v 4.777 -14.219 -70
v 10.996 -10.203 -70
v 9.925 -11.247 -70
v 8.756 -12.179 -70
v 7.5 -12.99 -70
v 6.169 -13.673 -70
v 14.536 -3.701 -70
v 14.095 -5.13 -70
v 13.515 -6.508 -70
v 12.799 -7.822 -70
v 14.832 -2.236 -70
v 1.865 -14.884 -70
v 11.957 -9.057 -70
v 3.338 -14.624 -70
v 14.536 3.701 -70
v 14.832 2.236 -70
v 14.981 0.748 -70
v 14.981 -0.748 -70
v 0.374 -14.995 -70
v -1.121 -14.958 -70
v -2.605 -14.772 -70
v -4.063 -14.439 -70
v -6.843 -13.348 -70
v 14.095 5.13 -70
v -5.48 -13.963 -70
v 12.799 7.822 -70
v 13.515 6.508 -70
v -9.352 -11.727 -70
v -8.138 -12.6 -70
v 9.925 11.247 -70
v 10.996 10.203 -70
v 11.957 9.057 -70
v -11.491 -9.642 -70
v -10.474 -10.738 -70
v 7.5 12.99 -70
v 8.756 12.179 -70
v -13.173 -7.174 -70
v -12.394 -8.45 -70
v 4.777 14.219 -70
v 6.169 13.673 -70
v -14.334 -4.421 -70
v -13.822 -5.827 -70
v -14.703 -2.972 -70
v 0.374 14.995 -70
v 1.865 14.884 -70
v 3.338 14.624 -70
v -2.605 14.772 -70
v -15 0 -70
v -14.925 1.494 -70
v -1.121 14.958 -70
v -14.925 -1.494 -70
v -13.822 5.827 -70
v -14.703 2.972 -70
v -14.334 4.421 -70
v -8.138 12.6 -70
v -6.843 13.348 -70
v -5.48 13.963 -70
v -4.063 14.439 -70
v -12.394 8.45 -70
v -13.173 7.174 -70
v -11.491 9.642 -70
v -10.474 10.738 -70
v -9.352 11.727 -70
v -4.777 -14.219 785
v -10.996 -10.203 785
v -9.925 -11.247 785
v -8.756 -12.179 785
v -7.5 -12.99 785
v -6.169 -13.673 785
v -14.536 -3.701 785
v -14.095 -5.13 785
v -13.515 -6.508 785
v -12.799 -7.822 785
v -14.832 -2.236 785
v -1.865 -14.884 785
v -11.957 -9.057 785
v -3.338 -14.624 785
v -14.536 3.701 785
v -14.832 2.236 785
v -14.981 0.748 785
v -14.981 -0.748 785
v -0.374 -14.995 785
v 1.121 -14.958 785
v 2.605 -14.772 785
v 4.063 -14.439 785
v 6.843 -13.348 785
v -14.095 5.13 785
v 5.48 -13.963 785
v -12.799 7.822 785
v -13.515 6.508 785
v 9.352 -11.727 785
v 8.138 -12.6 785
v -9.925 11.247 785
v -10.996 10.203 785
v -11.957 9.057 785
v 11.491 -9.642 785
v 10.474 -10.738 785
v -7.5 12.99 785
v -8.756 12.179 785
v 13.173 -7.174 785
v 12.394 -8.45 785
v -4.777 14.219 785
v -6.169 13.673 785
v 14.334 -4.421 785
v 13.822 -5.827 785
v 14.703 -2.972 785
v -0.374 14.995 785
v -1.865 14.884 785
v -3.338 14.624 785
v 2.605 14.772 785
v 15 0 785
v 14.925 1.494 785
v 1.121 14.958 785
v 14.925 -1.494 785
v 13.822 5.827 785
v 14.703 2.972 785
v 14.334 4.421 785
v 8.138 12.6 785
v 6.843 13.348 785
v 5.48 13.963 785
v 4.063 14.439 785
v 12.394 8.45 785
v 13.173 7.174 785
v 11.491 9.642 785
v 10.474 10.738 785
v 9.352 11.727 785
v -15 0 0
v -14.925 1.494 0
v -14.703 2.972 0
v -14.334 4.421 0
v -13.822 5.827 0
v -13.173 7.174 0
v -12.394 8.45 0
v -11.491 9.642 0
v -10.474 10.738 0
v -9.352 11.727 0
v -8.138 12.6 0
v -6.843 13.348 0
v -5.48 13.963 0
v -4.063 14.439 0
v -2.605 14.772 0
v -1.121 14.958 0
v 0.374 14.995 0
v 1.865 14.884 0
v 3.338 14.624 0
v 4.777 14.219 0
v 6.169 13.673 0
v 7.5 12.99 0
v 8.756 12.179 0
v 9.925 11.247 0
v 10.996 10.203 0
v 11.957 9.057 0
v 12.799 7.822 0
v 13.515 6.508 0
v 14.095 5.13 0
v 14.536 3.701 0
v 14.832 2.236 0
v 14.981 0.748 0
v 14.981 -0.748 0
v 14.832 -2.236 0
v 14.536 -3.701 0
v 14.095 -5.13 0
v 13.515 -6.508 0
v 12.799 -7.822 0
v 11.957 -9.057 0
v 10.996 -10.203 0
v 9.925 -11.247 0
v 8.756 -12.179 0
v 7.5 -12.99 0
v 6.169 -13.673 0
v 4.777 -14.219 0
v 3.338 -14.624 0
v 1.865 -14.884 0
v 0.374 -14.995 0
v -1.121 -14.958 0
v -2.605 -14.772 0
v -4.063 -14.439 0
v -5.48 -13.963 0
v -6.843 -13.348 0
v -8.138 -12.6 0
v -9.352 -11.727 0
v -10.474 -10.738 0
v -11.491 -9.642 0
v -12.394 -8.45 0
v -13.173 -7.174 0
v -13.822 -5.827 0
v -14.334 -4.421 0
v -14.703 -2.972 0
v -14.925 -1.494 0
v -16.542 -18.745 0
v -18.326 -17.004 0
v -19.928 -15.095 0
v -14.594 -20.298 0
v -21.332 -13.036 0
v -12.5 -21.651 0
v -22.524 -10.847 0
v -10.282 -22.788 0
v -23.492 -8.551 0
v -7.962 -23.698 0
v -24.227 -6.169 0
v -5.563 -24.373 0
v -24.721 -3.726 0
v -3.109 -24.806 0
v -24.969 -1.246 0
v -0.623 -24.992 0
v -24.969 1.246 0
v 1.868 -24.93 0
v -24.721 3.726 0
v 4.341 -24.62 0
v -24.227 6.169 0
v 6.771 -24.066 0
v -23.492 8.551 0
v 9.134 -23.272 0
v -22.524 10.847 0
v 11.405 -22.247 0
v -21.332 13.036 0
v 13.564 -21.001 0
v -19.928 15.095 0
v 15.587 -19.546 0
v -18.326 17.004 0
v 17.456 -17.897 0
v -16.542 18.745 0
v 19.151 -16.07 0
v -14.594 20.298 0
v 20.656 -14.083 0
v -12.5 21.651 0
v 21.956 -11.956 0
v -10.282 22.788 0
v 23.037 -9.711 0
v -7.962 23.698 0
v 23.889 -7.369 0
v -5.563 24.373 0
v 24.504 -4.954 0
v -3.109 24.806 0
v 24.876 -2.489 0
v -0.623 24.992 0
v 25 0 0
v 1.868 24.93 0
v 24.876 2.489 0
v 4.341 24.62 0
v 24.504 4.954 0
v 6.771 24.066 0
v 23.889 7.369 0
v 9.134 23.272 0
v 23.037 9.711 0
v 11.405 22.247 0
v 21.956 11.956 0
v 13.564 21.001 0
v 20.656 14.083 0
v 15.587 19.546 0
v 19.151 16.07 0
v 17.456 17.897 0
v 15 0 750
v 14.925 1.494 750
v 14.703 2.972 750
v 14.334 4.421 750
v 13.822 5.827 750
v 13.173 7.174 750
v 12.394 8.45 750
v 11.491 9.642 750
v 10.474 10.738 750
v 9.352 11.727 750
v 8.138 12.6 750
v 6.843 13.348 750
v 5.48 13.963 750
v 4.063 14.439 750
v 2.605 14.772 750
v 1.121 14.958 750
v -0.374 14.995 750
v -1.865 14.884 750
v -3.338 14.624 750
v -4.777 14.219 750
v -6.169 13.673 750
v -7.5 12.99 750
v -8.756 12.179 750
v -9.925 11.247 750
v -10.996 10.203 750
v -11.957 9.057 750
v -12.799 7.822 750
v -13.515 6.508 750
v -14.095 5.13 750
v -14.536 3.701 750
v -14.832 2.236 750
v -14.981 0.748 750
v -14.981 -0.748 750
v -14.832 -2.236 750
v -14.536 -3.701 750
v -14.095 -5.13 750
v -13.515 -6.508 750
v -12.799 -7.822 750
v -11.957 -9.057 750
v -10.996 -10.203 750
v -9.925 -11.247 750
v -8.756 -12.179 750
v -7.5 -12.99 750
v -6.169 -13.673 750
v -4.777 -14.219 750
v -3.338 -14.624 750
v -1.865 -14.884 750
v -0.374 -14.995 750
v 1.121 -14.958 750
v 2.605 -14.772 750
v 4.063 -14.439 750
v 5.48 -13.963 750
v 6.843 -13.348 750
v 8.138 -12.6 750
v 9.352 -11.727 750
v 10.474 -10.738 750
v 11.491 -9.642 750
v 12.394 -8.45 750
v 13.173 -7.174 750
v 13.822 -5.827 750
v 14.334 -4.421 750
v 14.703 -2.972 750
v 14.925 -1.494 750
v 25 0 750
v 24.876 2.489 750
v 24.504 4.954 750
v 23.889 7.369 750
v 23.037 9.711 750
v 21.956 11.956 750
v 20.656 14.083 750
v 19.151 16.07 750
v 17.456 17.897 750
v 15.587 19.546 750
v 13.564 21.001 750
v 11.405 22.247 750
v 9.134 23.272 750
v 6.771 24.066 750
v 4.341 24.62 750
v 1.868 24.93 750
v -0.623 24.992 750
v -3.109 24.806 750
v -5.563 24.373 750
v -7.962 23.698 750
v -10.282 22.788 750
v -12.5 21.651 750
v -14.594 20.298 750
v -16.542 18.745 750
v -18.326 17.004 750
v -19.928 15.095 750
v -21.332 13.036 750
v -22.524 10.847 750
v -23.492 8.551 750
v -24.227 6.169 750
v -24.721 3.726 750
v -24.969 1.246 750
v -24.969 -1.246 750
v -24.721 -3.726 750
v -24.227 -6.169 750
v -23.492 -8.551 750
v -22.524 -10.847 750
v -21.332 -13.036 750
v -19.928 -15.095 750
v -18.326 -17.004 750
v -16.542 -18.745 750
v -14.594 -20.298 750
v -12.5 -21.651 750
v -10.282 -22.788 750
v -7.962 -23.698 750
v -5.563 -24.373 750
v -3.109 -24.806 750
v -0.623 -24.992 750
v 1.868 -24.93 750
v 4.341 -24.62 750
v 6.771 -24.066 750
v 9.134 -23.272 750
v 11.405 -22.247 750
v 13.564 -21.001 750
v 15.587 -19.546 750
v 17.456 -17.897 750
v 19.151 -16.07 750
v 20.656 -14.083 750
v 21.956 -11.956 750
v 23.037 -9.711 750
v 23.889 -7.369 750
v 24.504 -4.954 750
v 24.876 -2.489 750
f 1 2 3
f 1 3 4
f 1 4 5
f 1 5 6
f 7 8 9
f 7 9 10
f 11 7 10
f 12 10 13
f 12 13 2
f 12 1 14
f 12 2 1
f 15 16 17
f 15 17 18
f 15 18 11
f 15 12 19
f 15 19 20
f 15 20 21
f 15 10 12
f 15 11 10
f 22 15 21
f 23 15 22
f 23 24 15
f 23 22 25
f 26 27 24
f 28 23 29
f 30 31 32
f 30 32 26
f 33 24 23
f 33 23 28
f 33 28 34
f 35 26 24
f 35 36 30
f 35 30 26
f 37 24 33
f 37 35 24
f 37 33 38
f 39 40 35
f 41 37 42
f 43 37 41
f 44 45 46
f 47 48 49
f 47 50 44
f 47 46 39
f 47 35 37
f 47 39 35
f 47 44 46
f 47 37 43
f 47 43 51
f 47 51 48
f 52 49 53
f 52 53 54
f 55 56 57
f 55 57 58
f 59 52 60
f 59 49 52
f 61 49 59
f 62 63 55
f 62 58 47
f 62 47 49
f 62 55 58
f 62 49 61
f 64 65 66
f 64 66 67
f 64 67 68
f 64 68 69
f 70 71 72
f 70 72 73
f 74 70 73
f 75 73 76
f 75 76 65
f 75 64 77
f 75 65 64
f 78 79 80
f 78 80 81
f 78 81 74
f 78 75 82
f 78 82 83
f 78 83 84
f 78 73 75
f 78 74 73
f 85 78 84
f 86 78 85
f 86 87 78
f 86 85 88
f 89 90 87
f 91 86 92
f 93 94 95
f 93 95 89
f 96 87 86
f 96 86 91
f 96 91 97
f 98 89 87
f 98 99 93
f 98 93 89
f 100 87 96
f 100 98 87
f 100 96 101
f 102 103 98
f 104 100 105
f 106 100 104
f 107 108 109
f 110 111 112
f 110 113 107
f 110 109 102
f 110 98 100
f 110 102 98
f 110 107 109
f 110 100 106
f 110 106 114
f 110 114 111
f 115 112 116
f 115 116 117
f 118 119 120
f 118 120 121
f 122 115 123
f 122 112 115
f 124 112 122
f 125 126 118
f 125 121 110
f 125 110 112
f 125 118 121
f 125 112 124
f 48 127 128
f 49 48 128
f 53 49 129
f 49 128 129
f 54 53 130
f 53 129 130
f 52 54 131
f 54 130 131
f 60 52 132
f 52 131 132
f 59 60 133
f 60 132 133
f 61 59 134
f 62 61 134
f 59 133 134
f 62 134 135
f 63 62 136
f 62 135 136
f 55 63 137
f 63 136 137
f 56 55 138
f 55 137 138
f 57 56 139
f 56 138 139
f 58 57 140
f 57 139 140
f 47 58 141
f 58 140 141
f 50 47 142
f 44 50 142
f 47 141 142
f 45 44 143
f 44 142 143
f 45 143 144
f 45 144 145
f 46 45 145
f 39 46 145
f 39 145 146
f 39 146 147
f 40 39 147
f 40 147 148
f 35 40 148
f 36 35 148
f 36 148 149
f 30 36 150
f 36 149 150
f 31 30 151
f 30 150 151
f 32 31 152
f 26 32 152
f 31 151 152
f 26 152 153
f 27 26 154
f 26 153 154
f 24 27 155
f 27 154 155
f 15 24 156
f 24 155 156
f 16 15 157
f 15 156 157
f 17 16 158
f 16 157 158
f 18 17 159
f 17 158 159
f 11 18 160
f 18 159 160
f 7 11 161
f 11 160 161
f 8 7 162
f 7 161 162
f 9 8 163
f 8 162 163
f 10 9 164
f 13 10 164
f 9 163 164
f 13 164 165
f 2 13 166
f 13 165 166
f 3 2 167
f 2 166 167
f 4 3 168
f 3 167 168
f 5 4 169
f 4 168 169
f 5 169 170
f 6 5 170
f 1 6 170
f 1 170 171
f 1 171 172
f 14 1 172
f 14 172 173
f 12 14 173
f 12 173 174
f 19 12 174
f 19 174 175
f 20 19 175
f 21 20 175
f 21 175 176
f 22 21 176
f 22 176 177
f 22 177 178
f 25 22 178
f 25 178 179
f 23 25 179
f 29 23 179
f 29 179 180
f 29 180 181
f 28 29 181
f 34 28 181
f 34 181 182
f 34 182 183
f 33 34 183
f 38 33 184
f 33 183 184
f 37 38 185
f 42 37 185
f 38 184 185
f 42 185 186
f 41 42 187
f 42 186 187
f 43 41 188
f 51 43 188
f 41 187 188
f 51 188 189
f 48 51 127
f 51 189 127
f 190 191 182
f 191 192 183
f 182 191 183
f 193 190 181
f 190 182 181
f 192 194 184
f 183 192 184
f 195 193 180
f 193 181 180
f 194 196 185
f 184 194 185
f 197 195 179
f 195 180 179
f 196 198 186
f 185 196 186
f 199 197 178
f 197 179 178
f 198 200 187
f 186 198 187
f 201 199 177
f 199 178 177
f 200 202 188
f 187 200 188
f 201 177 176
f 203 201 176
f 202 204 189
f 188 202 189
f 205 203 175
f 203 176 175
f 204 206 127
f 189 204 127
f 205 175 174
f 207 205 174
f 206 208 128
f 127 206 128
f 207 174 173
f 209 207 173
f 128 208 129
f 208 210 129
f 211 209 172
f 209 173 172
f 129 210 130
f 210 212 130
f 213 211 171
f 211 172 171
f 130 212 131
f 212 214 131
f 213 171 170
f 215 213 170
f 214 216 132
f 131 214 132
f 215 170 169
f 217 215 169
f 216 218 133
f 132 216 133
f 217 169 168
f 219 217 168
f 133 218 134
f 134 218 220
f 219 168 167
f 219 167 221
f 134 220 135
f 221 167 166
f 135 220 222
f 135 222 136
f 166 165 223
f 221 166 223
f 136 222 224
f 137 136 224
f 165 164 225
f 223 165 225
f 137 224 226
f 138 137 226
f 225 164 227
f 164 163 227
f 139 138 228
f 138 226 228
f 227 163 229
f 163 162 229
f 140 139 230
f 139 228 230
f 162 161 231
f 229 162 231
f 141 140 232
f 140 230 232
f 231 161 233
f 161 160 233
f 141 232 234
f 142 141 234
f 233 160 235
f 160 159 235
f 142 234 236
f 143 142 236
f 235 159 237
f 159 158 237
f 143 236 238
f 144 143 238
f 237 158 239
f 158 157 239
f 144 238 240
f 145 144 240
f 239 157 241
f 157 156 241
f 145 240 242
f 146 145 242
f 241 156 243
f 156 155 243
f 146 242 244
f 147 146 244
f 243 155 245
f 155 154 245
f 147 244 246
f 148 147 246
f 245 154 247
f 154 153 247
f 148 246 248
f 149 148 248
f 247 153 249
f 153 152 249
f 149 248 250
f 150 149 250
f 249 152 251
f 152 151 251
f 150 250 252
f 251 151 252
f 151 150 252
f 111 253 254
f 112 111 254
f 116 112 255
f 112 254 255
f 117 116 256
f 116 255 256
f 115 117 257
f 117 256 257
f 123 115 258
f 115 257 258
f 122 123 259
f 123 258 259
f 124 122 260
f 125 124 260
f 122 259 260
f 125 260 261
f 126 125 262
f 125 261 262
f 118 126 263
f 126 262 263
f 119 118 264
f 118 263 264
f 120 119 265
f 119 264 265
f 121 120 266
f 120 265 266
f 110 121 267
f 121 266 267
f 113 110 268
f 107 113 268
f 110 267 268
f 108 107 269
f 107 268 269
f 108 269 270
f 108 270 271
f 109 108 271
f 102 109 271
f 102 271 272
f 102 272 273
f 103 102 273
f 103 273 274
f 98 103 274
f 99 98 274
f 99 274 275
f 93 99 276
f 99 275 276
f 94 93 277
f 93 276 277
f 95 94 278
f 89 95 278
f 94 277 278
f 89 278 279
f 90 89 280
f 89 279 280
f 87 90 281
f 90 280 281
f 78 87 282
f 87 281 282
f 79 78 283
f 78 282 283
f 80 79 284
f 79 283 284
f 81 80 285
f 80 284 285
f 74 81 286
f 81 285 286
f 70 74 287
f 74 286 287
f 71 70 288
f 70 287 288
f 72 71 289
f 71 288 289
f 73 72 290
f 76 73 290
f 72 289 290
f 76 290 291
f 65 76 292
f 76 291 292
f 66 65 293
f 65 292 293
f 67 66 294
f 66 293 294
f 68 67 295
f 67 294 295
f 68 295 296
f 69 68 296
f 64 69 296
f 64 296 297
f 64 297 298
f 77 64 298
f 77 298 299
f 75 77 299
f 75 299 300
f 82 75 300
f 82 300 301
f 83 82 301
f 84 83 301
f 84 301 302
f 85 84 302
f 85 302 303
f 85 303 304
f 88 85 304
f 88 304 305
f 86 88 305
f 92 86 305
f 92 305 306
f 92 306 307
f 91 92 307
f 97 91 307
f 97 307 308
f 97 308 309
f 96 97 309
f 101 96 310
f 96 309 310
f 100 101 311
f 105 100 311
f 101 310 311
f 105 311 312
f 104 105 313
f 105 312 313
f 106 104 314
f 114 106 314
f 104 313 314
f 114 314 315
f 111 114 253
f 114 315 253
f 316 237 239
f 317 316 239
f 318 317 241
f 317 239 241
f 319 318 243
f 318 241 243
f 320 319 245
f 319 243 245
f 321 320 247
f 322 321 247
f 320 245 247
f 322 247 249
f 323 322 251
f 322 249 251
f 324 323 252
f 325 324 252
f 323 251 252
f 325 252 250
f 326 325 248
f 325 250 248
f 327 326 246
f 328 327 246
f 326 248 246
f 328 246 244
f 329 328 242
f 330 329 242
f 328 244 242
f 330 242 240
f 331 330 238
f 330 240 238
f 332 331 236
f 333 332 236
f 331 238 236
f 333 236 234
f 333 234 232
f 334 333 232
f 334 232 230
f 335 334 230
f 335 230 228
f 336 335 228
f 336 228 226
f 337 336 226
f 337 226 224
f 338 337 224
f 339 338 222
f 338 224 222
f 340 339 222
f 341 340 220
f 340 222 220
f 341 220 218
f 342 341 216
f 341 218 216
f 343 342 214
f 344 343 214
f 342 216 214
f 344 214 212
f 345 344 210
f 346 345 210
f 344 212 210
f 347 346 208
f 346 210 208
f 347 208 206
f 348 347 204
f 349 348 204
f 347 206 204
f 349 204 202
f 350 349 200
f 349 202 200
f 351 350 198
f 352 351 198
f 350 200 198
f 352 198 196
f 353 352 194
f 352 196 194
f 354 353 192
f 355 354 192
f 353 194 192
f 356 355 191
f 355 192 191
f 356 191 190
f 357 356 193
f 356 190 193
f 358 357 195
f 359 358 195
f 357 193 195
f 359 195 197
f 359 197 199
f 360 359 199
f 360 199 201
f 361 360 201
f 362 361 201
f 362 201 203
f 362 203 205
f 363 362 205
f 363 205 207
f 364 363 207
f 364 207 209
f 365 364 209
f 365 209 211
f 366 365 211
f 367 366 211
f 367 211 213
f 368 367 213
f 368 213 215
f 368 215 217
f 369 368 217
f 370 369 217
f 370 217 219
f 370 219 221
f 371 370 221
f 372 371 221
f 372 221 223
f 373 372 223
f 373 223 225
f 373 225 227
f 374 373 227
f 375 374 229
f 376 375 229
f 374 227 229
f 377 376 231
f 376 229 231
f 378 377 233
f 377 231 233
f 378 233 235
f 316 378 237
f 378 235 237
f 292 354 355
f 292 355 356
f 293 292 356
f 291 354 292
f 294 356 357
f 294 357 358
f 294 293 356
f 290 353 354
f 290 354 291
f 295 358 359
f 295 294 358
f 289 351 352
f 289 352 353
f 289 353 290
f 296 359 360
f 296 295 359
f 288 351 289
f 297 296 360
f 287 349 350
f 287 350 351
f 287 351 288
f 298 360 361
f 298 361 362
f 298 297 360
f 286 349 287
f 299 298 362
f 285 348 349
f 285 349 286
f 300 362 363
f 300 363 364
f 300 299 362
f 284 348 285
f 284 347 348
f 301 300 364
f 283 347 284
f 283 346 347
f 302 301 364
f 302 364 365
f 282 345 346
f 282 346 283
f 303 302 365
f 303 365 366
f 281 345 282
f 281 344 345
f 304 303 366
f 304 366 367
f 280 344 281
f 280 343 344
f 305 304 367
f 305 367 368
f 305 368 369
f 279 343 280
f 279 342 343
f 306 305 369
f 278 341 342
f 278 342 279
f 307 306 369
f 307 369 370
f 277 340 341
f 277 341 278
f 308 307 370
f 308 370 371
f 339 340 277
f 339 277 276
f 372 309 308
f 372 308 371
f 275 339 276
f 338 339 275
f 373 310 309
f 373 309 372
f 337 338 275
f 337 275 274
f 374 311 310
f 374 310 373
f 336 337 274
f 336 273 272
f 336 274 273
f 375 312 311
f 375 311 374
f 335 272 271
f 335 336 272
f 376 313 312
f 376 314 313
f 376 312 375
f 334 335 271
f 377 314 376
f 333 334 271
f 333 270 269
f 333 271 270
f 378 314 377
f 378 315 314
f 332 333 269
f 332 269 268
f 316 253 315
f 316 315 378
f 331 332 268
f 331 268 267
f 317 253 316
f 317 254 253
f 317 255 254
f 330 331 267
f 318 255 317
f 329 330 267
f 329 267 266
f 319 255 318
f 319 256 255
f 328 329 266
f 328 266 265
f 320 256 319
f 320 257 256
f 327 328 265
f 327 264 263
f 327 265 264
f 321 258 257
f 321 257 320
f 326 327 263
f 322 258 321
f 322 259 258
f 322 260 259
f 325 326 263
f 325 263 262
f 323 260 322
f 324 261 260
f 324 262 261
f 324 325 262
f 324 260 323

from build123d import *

# Parameters (mm, degrees)
SKETCH1_R           = 25
BOSS_EXTRUDE2_DEPTH = 750
SKETCH2_R           = 15
BOSS_EXTRUDE3_DEPTH = 70
SKETCH3_R           = 15
BOSS_EXTRUDE4_DEPTH = 35


with BuildPart() as part:
    # Sketch1 → Boss-Extrude2 (new body)
    with BuildSketch(Plane.XY):
        Circle(SKETCH1_R)
    extrude(amount=BOSS_EXTRUDE2_DEPTH)

    # Sketch2 → Boss-Extrude3 (add)
    with BuildSketch(Plane(origin=(0, 0, 0), x_dir=(-1, 0, 0), z_dir=(0, 0, -1))):
        Circle(SKETCH2_R)
    extrude(amount=BOSS_EXTRUDE3_DEPTH)

    # Sketch3 → Boss-Extrude4 (add)
    with BuildSketch(Plane.XY.offset(750)):
        Circle(SKETCH3_R)
    extrude(amount=BOSS_EXTRUDE4_DEPTH)


solid = part.part
